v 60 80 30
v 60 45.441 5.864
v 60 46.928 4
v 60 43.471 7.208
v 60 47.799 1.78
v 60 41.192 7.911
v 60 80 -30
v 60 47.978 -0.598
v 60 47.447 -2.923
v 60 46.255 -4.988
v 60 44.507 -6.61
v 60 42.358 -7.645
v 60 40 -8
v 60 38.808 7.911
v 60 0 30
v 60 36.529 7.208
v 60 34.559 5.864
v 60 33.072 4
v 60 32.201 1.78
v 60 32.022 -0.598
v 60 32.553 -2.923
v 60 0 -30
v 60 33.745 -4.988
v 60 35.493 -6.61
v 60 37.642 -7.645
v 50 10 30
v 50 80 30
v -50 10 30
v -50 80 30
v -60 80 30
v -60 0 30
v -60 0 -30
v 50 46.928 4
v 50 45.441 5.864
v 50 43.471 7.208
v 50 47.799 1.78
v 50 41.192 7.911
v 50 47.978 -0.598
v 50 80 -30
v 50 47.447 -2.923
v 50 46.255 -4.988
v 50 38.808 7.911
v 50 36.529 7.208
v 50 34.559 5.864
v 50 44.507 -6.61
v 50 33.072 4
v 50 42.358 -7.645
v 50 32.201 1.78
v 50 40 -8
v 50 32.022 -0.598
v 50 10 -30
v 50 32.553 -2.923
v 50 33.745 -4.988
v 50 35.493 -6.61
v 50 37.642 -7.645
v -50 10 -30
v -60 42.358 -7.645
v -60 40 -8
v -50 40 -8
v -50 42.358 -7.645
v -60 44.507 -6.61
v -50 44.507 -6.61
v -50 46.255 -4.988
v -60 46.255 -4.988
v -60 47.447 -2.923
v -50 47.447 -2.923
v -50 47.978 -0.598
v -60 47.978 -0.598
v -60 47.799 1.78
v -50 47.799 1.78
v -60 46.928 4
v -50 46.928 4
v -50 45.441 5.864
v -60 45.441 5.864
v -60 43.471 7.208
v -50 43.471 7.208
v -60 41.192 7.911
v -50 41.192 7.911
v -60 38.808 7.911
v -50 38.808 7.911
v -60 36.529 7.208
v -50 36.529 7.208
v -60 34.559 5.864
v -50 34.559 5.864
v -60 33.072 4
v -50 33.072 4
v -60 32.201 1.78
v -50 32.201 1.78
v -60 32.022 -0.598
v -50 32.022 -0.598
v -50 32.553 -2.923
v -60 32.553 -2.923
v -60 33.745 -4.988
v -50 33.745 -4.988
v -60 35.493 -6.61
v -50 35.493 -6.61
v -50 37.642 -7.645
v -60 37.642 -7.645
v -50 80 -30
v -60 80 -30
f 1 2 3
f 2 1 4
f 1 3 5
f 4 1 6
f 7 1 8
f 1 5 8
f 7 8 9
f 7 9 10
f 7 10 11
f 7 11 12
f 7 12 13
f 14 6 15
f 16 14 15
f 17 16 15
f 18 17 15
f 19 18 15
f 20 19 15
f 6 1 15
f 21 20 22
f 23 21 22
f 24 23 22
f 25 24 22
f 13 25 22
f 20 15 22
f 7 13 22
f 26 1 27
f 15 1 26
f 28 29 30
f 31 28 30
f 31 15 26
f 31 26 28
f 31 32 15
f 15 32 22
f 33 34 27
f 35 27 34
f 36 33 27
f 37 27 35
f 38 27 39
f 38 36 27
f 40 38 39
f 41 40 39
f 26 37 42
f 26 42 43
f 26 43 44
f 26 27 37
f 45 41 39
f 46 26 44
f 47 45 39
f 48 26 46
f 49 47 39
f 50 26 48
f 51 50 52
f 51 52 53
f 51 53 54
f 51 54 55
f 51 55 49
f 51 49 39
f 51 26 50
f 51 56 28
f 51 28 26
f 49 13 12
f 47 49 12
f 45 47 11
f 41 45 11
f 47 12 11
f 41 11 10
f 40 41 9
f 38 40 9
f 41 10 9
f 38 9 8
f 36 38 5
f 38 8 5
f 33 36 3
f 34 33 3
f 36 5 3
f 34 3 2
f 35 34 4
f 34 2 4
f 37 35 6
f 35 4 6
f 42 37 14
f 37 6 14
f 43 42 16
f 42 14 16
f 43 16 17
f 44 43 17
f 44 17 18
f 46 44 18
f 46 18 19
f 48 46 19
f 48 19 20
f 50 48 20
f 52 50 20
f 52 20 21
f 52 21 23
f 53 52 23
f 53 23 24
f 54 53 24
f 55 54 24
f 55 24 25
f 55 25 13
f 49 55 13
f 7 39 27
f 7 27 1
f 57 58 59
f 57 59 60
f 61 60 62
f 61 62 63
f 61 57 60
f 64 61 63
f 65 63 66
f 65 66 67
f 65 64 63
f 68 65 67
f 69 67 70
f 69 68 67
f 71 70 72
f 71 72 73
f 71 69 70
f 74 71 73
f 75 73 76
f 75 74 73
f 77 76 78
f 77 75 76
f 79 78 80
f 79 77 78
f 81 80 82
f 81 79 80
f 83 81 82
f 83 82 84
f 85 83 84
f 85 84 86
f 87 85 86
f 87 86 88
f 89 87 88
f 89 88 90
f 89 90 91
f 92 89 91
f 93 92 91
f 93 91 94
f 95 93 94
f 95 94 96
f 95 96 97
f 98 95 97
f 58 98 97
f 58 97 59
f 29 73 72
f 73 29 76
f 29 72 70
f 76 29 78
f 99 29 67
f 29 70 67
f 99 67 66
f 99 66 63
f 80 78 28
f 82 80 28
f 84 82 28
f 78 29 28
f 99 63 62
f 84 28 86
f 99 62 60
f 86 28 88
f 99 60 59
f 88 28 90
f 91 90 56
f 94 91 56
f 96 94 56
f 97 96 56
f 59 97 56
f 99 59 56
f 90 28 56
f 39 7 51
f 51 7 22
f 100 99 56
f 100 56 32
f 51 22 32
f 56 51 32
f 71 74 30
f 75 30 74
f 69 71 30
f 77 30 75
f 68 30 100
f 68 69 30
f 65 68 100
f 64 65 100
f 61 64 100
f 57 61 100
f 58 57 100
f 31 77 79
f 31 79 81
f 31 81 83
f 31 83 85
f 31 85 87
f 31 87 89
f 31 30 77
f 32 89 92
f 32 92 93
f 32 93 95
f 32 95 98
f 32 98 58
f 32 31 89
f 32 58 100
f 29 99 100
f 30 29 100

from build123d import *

# Parameters (mm, degrees)
SKETCH2_W        = 120
SKETCH2_H        = 60
BASE_DEPTH       = 10
SKETCH5_W        = 10
SKETCH5_H        = 60
UPRIGHT_DEPTH    = 70
SKETCH6_R        = 8
SHAFT_HOLE_DEPTH = 50


with BuildPart() as part:
    # Sketch2 → Base (new body)
    with BuildSketch(Plane(origin=(0, 0, 0), x_dir=(1, 0, 0), z_dir=(0, 1, 0))):
        Rectangle(SKETCH2_W, SKETCH2_H)
    extrude(amount=BASE_DEPTH)

    # Sketch5 → Upright (add)
    with BuildSketch(Plane(origin=(0, 10, 0), x_dir=(1, 0, 0), z_dir=(0, 1, 0))):
        with Locations((55, 0)):
            Rectangle(SKETCH5_W, SKETCH5_H)
    extrude(amount=UPRIGHT_DEPTH)

    # Sketch6 → Shaft Hole (cut)
    with BuildSketch(Plane(origin=(60, 0, 0), x_dir=(0, 0, -1), z_dir=(1, 0, 0))):
        with Locations((0, 40)):
            Circle(SKETCH6_R)
    extrude(amount=-SHAFT_HOLE_DEPTH, mode=Mode.SUBTRACT)

    # Mirror 2: part across plane


with BuildPart() as part_1:
    add(part.part)
    add(part.part.mirror(Plane(origin=(0, 0, 0), x_dir=(0, 0, 1), z_dir=(1, 0, 0))))


solid = part_1.part
